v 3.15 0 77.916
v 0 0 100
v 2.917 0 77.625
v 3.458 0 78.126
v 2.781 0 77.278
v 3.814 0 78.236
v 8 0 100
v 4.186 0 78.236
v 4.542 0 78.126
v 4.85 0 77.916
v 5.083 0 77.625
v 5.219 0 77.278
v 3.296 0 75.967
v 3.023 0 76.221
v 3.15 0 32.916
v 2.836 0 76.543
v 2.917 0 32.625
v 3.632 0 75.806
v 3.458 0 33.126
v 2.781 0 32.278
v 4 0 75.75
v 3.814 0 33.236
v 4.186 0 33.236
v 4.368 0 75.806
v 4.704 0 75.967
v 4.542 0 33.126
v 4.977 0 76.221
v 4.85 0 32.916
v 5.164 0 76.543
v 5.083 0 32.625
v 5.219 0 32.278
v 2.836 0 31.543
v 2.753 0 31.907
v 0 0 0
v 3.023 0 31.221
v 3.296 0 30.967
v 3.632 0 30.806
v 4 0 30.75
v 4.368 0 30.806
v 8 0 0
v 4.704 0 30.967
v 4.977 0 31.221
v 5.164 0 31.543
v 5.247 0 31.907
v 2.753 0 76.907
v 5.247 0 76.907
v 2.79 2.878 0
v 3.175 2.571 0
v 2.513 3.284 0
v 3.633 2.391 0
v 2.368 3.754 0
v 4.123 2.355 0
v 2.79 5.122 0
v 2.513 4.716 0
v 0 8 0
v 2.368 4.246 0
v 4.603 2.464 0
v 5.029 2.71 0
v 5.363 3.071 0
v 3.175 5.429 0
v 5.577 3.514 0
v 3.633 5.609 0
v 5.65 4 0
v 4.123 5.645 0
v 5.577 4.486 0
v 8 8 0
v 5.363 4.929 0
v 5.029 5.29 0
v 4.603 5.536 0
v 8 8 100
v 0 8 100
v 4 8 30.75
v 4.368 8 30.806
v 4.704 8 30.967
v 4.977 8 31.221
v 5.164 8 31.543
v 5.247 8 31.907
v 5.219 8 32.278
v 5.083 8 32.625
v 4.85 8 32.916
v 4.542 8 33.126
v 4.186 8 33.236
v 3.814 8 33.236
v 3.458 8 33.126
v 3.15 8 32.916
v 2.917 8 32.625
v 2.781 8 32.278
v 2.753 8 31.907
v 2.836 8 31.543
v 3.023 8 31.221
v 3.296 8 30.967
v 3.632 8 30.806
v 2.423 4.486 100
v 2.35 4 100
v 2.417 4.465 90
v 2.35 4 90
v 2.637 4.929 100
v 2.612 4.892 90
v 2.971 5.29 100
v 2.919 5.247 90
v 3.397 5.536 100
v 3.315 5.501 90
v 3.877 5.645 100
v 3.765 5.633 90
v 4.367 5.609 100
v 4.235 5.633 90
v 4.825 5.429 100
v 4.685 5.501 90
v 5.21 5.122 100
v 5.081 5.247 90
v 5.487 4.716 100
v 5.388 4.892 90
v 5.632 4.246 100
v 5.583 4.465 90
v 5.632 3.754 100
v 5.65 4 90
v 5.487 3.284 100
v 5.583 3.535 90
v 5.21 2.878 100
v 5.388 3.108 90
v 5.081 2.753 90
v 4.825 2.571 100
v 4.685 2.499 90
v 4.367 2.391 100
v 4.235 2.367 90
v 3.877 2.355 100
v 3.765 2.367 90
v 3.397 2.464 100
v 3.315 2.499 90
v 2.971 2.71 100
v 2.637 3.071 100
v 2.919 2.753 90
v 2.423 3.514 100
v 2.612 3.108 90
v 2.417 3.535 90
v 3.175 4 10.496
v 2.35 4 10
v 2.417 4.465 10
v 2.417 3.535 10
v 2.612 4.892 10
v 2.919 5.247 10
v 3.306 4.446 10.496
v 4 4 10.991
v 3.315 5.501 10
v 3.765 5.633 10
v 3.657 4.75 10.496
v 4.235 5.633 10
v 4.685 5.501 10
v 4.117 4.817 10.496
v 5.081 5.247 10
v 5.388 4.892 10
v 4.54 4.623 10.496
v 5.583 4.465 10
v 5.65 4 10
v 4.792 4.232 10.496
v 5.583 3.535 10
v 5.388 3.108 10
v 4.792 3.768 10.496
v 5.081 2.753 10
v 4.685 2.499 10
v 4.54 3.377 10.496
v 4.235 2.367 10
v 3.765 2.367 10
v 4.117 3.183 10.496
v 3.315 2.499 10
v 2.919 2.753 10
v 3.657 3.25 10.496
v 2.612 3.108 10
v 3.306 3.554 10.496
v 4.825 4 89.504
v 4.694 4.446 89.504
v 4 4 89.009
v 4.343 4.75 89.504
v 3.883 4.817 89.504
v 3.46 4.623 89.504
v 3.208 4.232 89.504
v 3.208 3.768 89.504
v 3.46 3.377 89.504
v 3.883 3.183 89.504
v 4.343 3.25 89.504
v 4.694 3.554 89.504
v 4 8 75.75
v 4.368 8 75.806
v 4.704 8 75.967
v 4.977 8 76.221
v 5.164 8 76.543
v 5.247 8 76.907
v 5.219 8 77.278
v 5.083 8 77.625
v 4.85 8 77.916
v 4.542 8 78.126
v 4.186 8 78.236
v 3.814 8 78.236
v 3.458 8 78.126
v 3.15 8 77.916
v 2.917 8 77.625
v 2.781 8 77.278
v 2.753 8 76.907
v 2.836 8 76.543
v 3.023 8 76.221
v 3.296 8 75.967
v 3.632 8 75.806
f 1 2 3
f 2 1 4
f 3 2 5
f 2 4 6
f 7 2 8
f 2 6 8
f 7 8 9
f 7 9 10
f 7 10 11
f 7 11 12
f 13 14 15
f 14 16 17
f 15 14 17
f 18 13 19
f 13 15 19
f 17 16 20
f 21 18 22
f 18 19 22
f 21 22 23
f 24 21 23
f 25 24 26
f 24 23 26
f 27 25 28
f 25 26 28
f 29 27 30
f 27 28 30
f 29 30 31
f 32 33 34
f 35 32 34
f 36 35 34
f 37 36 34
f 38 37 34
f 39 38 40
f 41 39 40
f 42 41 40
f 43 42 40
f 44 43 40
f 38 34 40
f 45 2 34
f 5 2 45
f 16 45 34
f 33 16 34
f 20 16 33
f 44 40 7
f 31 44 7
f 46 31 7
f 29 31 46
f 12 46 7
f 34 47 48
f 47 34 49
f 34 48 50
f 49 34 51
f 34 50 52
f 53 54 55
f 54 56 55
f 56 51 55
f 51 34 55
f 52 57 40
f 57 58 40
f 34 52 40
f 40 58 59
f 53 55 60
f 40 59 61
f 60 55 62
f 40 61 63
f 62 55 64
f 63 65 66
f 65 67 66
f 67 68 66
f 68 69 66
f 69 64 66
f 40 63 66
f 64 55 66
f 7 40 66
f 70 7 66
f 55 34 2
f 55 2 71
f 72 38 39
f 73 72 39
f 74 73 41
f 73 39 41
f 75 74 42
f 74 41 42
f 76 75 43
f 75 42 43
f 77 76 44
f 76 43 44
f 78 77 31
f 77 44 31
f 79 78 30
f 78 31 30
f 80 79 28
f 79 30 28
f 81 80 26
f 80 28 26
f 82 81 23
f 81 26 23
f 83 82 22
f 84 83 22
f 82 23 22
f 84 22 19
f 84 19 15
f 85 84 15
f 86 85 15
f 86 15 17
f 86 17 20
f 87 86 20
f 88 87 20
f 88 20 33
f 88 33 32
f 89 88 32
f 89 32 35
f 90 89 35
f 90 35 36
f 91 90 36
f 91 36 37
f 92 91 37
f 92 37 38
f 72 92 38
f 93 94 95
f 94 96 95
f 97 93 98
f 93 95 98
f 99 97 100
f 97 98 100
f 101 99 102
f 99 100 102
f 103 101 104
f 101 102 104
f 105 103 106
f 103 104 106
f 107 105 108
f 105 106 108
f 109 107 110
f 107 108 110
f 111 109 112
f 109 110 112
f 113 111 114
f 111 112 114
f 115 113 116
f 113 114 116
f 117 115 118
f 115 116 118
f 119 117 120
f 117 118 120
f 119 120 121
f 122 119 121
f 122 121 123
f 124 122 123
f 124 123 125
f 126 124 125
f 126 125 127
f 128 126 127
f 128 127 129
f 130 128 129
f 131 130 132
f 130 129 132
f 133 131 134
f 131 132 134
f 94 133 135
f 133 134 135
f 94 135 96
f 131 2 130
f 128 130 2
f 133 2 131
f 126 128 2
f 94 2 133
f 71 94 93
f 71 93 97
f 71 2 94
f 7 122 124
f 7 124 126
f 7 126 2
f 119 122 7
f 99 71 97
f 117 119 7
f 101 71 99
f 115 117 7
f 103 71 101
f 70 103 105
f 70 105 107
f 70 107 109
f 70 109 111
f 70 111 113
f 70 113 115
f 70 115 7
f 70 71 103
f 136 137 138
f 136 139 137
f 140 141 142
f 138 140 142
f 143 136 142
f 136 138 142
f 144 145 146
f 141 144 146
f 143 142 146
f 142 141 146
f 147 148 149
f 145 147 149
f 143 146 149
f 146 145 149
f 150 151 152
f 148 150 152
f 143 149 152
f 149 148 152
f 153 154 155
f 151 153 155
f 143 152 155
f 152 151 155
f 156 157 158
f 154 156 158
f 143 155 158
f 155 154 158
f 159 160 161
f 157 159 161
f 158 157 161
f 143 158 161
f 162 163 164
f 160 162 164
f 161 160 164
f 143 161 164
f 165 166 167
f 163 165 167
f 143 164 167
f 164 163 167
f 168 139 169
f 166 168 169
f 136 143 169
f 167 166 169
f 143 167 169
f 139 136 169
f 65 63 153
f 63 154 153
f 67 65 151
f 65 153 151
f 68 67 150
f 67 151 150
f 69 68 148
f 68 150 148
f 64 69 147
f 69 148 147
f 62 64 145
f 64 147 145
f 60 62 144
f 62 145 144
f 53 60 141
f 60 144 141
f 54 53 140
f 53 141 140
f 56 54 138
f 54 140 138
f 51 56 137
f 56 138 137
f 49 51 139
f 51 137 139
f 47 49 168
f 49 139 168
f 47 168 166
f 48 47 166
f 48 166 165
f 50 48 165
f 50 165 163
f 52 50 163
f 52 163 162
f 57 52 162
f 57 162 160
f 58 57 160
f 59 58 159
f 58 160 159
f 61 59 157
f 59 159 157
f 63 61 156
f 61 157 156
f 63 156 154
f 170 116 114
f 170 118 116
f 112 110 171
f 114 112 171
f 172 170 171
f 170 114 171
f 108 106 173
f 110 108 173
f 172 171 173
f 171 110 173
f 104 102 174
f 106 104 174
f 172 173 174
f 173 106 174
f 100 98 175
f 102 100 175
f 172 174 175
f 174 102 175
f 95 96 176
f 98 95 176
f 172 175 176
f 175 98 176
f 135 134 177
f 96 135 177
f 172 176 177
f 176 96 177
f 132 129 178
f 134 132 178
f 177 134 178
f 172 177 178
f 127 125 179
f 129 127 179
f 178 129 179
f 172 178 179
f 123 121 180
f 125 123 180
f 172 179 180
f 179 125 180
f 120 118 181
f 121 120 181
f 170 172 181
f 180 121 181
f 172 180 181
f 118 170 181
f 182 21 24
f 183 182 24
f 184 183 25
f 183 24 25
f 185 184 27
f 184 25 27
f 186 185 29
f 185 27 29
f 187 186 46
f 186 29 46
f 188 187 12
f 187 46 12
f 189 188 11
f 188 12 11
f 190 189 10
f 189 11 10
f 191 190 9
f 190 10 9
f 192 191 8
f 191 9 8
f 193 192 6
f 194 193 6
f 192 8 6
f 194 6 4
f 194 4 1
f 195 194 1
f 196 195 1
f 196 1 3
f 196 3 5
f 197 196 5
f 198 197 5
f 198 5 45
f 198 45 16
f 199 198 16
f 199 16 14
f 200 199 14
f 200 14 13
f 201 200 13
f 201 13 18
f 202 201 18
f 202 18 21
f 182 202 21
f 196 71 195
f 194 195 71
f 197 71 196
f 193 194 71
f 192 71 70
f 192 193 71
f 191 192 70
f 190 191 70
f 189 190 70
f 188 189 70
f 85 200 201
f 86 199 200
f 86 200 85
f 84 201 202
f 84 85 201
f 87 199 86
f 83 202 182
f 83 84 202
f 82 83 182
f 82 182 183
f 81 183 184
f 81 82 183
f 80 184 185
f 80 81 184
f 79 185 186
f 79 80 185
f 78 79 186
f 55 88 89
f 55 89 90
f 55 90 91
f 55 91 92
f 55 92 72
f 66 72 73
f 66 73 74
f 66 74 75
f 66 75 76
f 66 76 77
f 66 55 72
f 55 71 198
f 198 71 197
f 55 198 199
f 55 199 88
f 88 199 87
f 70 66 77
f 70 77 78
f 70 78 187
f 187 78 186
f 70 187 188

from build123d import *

# Parameters (mm, degrees)
SKETCH1_W                       = 8
SKETCH1_H                       = 8
EXTRUDE1_DEPTH                  = 100
M3_TAPPED_HOLE1_D               = 2.5
M4_TAPPED_HOLE1_D               = 3.3
M4_TAPPED_HOLE1_DEPTH           = 10
M4_TAPPED_HOLE1_TIP             = 0.991420021
M4_TAPPED_HOLE1_ON_FACE_2_D     = 3.3
M4_TAPPED_HOLE1_ON_FACE_2_DEPTH = 10
M4_TAPPED_HOLE1_ON_FACE_2_TIP   = 0.991420021


with BuildPart() as part:
    # Sketch1 → Extrude1 (new body)
    with BuildSketch(Plane.XY):
        with Locations((4, 4)):
            Rectangle(SKETCH1_W, SKETCH1_H)
    extrude(amount=EXTRUDE1_DEPTH)

    # M3 Tapped Hole1 (through all)
    with Locations(Plane(origin=(4, 8, 77), x_dir=(0, 0, 1), z_dir=(0, 1, 0))):
        with Locations((0, 0), (-45, 0)):
            Hole(M3_TAPPED_HOLE1_D / 2)

    # M4 Tapped Hole1
    with Locations(Plane(origin=(4, 4, 0), x_dir=(-1, 0, 0), z_dir=(0, 0, -1))):
        with Locations((0, 0)):
            Hole(M4_TAPPED_HOLE1_D / 2, depth=M4_TAPPED_HOLE1_DEPTH)
            with Locations((0, 0, -(M4_TAPPED_HOLE1_DEPTH + M4_TAPPED_HOLE1_TIP / 2))):  # 118° drill point
                Cone(0, M4_TAPPED_HOLE1_D / 2, M4_TAPPED_HOLE1_TIP, mode=Mode.SUBTRACT)

    # M4 Tapped Hole1 on face 2
    with Locations(Plane(origin=(4, 4, 100), x_dir=(1, 0, 0), z_dir=(0, 0, 1))):
        with Locations((0, 0)):
            Hole(M4_TAPPED_HOLE1_ON_FACE_2_D / 2, depth=M4_TAPPED_HOLE1_ON_FACE_2_DEPTH)
            with Locations((0, 0, -(M4_TAPPED_HOLE1_ON_FACE_2_DEPTH + M4_TAPPED_HOLE1_ON_FACE_2_TIP / 2))):  # 118° drill point
                Cone(0, M4_TAPPED_HOLE1_ON_FACE_2_D / 2, M4_TAPPED_HOLE1_ON_FACE_2_TIP, mode=Mode.SUBTRACT)


solid = part.part
